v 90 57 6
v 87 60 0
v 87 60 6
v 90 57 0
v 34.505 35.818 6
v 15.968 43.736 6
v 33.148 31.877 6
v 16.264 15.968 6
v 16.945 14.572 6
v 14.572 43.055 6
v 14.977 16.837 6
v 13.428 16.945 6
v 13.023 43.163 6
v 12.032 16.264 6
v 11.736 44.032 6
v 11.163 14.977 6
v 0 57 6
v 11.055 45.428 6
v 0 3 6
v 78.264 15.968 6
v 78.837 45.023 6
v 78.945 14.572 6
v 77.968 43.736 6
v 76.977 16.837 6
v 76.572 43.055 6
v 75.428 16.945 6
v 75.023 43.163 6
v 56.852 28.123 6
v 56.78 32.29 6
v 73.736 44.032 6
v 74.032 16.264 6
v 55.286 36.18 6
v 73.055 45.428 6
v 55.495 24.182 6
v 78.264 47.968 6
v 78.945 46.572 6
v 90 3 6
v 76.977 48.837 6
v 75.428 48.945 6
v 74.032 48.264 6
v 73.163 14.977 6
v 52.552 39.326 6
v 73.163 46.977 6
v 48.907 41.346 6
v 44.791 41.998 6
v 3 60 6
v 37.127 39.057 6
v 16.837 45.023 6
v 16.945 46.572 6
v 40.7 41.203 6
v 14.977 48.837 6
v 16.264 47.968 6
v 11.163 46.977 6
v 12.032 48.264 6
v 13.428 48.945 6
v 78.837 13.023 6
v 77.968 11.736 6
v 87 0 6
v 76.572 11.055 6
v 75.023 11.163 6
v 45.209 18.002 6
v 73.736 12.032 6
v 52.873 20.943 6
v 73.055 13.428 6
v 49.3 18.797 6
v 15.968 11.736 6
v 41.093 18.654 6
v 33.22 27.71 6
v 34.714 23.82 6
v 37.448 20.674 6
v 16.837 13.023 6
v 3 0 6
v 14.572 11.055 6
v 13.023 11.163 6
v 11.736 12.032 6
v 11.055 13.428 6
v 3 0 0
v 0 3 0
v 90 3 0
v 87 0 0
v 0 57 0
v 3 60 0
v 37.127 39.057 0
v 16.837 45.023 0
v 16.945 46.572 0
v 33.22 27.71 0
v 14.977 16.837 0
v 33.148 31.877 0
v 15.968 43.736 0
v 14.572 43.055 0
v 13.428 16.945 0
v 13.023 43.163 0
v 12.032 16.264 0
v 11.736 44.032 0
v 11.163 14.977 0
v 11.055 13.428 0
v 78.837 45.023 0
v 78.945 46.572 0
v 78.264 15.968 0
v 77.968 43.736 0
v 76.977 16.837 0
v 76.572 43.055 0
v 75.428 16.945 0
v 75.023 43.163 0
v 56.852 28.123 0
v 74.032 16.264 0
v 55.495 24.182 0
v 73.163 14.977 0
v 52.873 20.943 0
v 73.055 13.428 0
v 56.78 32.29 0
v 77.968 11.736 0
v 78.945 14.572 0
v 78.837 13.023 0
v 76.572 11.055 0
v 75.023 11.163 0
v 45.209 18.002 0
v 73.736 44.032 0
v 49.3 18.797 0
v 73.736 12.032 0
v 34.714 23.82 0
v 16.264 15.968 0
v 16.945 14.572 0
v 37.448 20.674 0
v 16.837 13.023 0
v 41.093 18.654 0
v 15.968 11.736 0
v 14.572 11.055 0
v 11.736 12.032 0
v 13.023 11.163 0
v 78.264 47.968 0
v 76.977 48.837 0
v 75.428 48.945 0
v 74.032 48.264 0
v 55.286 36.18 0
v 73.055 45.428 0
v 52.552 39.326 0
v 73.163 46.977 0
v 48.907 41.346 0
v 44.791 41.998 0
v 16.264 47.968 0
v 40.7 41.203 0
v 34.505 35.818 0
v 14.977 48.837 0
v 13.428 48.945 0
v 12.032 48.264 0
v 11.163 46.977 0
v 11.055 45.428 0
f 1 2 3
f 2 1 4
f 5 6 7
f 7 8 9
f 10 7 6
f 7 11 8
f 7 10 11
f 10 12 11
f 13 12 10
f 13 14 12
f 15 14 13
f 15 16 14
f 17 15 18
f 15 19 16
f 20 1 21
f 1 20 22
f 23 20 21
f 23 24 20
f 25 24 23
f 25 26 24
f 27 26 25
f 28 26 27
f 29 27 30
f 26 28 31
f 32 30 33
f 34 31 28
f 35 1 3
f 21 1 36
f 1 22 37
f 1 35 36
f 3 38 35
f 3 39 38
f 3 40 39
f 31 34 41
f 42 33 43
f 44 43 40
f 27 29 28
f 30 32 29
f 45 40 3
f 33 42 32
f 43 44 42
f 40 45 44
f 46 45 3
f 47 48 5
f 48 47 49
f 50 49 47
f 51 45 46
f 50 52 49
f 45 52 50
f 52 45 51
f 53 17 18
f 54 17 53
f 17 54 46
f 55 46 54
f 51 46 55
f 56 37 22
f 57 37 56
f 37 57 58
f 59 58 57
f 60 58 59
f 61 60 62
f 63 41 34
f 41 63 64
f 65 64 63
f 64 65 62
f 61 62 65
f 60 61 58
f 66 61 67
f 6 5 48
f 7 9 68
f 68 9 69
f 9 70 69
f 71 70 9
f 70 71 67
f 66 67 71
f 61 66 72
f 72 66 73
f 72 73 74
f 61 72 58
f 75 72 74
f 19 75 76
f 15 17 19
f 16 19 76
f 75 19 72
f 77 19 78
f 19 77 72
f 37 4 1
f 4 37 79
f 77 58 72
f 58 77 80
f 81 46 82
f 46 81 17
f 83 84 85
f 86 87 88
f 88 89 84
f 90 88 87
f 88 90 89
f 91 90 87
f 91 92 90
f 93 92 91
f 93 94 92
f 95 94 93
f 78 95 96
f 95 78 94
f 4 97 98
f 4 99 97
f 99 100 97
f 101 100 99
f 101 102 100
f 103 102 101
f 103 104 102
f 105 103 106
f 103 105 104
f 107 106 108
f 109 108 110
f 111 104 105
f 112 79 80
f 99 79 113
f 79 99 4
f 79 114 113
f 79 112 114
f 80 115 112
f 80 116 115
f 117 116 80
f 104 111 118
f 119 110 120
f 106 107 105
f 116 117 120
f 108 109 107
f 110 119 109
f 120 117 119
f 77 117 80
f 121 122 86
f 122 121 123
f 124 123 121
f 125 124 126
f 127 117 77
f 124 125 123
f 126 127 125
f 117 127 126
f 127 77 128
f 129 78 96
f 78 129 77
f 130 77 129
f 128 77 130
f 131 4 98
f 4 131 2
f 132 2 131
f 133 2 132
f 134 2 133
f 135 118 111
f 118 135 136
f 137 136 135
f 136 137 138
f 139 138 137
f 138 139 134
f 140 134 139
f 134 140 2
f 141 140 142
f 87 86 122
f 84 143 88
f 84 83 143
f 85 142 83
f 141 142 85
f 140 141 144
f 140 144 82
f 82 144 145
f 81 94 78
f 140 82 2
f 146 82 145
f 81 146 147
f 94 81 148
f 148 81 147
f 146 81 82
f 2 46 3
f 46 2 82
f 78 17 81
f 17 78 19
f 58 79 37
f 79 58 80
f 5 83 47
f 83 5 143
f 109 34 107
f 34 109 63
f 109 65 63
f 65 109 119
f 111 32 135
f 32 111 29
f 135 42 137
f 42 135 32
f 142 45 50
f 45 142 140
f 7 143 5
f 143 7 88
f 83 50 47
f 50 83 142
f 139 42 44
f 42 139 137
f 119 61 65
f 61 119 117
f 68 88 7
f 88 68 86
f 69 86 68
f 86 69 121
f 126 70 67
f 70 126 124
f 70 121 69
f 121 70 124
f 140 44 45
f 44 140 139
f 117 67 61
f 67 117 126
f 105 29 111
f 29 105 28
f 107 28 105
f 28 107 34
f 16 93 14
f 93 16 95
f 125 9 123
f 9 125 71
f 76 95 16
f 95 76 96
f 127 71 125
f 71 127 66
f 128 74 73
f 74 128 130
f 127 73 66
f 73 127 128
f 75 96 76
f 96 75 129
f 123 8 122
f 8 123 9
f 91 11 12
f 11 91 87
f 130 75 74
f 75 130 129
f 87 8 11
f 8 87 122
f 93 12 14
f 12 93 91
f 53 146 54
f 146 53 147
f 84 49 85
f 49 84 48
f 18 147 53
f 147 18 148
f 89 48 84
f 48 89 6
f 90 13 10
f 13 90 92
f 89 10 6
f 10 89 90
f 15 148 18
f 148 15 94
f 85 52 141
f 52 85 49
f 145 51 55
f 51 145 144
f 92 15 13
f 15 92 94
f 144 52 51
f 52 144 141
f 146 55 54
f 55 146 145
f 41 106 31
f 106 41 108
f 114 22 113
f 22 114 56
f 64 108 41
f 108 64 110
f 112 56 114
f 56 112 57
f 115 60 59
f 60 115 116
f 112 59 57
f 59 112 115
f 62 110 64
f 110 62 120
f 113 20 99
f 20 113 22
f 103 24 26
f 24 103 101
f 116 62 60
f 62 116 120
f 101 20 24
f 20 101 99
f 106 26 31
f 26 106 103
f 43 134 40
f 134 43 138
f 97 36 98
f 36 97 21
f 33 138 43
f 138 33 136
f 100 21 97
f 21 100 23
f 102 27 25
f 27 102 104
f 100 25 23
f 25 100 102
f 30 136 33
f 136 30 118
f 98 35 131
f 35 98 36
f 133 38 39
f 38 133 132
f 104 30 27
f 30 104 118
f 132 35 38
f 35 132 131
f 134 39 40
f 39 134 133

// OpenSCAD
$fn = 32;

// ----------------------------------------------------------------------
// Spacer plate: rect 90 x 60
// ----------------------------------------------------------------------

// --- parameters (mm) ---
bore_r = 12;              // centre bore radius
bolt_r = 3;               // bolt hole radius
plate_t = 6;              // plate thickness, Z (extrusion height)
plate_l = 90;             // plate length, X
plate_w = 60;             // plate width, Y
inset = 14;               // corner hole inset

profile = [[3, 0], [87, 0], [90, 3], [90, 57], [87, 60], [3, 60], [0, 57], [0, 3]];  // primary outline, 8 points, counter clockwise
void_1 = [[56.78, 32.29], [55.286, 36.18], [52.552, 39.326], [48.907, 41.346], [44.791, 41.998], [40.7, 41.203], [37.127, 39.057], [34.505, 35.818], [33.148, 31.877], [33.22, 27.71], [34.714, 23.82], [37.448, 20.674], [41.093, 18.654], [45.209, 18.002], [49.3, 18.797], [52.873, 20.943], [55.495, 24.182], [56.852, 28.123]];  // centre bore, 18 points
void_2 = [[16.945, 14.572], [16.264, 15.968], [14.977, 16.837], [13.428, 16.945], [12.032, 16.264], [11.163, 14.977], [11.055, 13.428], [11.736, 12.032], [13.023, 11.163], [14.572, 11.055], [15.968, 11.736], [16.837, 13.023]];  // corner hole, 12 points
void_3 = [[16.945, 46.572], [16.264, 47.968], [14.977, 48.837], [13.428, 48.945], [12.032, 48.264], [11.163, 46.977], [11.055, 45.428], [11.736, 44.032], [13.023, 43.163], [14.572, 43.055], [15.968, 43.736], [16.837, 45.023]];  // corner hole, 12 points
void_4 = [[78.945, 14.572], [78.264, 15.968], [76.977, 16.837], [75.428, 16.945], [74.032, 16.264], [73.163, 14.977], [73.055, 13.428], [73.736, 12.032], [75.023, 11.163], [76.572, 11.055], [77.968, 11.736], [78.837, 13.023]];  // corner hole, 12 points
void_5 = [[78.945, 46.572], [78.264, 47.968], [76.977, 48.837], [75.428, 48.945], [74.032, 48.264], [73.163, 46.977], [73.055, 45.428], [73.736, 44.032], [75.023, 43.163], [76.572, 43.055], [77.968, 43.736], [78.837, 45.023]];  // corner hole, 12 points

// --- the one profile operation ---
difference() {
  linear_extrude(height = plate_t) polygon(points = profile);
  translate([0, 0, -1])
    linear_extrude(height = plate_t + 2) polygon(points = void_1);
  translate([0, 0, -1])
    linear_extrude(height = plate_t + 2) polygon(points = void_2);
  translate([0, 0, -1])
    linear_extrude(height = plate_t + 2) polygon(points = void_3);
  translate([0, 0, -1])
    linear_extrude(height = plate_t + 2) polygon(points = void_4);
  translate([0, 0, -1])
    linear_extrude(height = plate_t + 2) polygon(points = void_5);
}
